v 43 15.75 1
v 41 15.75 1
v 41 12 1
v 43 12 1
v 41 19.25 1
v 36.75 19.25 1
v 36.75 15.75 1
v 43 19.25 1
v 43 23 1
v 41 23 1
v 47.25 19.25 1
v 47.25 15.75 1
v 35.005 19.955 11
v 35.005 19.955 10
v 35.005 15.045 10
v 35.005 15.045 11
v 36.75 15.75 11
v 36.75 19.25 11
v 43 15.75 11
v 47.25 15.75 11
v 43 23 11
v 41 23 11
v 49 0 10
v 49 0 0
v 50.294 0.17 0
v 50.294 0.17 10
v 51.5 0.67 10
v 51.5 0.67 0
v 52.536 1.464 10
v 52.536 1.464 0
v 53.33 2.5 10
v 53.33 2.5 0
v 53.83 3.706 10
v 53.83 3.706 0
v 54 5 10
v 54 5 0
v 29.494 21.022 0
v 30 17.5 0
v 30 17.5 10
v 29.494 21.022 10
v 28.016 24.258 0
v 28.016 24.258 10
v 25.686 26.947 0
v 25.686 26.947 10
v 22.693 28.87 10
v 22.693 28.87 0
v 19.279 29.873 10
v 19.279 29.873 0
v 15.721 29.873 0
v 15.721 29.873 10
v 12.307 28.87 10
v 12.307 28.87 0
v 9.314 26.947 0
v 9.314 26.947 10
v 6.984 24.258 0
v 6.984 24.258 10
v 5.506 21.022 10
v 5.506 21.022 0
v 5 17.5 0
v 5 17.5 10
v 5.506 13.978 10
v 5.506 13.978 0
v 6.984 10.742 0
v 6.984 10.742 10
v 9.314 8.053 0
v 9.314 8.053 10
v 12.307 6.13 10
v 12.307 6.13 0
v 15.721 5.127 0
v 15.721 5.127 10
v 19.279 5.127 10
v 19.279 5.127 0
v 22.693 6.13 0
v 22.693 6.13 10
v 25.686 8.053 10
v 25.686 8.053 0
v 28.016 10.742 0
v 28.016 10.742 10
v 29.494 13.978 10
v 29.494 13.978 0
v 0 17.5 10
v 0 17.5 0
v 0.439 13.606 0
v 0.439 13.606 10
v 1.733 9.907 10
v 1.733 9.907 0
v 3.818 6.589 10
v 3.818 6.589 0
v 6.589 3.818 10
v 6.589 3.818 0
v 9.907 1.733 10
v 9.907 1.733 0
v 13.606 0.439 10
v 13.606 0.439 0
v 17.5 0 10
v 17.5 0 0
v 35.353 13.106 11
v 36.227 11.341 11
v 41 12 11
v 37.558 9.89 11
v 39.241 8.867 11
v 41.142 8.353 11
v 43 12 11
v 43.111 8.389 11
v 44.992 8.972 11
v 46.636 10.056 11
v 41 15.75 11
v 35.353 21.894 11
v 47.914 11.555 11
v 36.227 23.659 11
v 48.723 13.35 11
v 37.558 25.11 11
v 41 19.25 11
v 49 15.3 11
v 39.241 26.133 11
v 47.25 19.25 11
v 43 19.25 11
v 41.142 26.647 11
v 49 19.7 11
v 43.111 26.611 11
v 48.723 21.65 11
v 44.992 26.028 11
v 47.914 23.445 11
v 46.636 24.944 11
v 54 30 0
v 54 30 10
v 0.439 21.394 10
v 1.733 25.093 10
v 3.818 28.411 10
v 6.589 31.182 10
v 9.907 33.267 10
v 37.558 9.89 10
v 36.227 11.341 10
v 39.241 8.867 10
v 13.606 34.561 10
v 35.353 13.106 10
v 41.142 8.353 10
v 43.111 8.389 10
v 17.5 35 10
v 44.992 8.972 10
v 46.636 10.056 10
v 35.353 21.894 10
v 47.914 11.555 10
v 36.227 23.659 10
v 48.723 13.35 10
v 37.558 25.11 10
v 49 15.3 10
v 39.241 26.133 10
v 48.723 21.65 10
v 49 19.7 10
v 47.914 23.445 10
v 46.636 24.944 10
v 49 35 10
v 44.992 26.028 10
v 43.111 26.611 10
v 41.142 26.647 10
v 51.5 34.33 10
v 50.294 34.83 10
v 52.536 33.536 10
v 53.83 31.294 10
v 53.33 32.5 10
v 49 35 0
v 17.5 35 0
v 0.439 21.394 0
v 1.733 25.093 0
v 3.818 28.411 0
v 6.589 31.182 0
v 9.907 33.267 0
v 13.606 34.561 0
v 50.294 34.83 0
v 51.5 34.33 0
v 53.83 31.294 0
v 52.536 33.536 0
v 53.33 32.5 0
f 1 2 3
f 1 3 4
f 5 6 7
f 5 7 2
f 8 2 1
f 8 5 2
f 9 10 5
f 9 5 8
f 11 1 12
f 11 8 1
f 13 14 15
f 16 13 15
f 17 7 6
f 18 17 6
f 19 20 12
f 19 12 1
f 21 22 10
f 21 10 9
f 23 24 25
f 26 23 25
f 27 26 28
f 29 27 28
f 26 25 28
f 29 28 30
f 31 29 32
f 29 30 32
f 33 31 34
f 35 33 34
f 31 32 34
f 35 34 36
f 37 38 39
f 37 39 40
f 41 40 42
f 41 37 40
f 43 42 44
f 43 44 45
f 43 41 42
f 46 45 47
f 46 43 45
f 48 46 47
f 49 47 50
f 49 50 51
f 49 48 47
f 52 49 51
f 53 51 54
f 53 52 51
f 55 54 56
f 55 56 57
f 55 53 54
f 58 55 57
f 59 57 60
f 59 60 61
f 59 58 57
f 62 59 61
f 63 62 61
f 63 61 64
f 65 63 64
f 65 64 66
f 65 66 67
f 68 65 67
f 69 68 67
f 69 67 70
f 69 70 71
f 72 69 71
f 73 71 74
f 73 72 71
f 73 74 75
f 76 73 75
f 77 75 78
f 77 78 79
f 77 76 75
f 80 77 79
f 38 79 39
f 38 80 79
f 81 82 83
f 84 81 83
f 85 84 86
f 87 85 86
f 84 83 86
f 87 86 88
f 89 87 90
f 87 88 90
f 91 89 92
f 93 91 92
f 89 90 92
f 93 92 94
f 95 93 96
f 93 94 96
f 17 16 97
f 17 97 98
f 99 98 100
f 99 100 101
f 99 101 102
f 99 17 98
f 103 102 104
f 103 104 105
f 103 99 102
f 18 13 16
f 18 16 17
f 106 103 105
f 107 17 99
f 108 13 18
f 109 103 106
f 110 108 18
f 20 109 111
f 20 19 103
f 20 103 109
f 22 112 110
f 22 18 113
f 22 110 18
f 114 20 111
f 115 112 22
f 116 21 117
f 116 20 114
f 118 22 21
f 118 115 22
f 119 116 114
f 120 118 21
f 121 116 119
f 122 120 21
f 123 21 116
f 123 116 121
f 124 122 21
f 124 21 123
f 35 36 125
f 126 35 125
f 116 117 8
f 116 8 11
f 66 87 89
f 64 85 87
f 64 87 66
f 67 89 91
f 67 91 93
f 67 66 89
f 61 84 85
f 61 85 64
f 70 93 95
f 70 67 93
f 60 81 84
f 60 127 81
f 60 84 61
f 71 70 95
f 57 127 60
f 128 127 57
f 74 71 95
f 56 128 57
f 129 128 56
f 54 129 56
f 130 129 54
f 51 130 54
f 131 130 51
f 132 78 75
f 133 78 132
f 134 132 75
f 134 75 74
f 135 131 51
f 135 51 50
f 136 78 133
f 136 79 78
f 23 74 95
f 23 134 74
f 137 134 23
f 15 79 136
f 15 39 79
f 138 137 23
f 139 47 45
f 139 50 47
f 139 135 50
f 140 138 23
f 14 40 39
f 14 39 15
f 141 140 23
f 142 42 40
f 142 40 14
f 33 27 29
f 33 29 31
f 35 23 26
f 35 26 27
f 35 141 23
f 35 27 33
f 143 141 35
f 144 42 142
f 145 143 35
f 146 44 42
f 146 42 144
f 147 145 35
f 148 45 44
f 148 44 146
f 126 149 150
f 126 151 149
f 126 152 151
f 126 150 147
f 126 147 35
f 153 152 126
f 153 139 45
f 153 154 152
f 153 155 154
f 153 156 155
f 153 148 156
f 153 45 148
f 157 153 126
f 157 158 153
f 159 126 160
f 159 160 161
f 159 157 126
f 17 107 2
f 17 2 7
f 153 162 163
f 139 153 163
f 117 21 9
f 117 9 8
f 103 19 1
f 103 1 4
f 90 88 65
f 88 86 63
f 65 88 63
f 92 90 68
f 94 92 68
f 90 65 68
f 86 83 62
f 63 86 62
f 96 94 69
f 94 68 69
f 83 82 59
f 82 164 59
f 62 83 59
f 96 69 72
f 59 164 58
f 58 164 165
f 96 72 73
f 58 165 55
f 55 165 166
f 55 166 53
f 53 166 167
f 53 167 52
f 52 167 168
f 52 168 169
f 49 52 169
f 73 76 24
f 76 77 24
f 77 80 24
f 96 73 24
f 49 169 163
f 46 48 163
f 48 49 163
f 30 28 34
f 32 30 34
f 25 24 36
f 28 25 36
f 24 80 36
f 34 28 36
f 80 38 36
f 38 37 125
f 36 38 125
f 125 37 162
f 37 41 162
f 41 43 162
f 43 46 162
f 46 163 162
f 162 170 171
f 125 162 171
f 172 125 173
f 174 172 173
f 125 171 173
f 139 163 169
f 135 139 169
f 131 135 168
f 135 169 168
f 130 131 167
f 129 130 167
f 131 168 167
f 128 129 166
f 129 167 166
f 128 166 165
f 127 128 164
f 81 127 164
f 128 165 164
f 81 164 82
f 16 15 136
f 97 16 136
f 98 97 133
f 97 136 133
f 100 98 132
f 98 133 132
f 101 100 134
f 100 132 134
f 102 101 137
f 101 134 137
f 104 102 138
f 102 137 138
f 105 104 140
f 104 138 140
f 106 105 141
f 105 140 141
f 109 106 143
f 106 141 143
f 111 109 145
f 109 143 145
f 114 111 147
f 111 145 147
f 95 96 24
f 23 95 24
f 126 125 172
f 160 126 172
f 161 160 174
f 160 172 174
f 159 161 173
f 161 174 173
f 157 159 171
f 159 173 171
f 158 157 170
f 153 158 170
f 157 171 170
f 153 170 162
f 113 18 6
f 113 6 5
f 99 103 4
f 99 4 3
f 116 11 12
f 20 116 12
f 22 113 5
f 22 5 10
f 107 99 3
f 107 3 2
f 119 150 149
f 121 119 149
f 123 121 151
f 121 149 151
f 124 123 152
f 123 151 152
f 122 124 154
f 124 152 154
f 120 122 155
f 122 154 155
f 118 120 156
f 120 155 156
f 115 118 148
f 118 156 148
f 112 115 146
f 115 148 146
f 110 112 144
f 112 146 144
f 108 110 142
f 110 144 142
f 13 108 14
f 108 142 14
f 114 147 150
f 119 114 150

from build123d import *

# Parameters (mm, degrees)
F0_R     = 12.5
F1_DEPTH = 10
F3_DEPTH = 1
F4_DEPTH = 9


with BuildPart() as f1:
    # F0 (on Top) → F1 (new body)
    with BuildSketch(Plane.XY):
        with BuildLine():
            ThreePointArc((0, 17.5), (5.1256313292, 5.1256313292), (17.5, 0))
            Line((17.5, 0), (49, 0))
            ThreePointArc((49, 0), (52.5355339059, 1.4644660941), (54, 5))
            Line((54, 5), (54, 30))
            ThreePointArc((54, 30), (52.5355339059, 33.5355339059), (49, 35))
            Line((49, 35), (17.5, 35))
            ThreePointArc((17.5, 35), (5.1256313292, 29.8743686708), (0, 17.5))
        make_face()
        with Locations((17.5, 17.5)):
            Circle(F0_R, mode=Mode.SUBTRACT)
    extrude(amount=F1_DEPTH)

    # F2 (on face) → F3 (join)
    with BuildSketch(Plane.XY.offset(10)):
        with BuildLine():
            ThreePointArc((49, 19.7), (42.1277095354, 26.6988349227), (35.0046599215, 19.9553765589))
            Line((35.0046599215, 19.9553765589), (35.0046599215, 19.4446234411))
            Line((35.0046599215, 19.4446234411), (35.0046599215, 17.5))
            Line((35.0046599215, 17.5), (35.0046599215, 15.5553765589))
            Line((35.0046599215, 15.5553765589), (35.0046599215, 15.0446234411))
            ThreePointArc((35.0046599215, 15.0446234411), (42.1277095354, 8.3011650773), (49, 15.3))
            Line((49, 15.3), (49, 17.5))
            Line((49, 17.5), (49, 19.7))
        make_face()
        Polygon((41, 23), (43, 23), (43, 19.25), (47.25, 19.25), (47.25, 15.75), (43, 15.75), (43, 12), (41, 12), (41, 15.75), (36.75, 15.75), (36.75, 19.25), (41, 19.25), align=None, mode=Mode.SUBTRACT)
    extrude(amount=F3_DEPTH)

    # F4 (cut): a face of the model
    f4_faces = [f1.faces().sort_by_distance(p)[0] for p in [
        (42, 17.5, 10),
    ]]
    extrude(f4_faces, amount=-F4_DEPTH, mode=Mode.SUBTRACT)


solid = f1.part
